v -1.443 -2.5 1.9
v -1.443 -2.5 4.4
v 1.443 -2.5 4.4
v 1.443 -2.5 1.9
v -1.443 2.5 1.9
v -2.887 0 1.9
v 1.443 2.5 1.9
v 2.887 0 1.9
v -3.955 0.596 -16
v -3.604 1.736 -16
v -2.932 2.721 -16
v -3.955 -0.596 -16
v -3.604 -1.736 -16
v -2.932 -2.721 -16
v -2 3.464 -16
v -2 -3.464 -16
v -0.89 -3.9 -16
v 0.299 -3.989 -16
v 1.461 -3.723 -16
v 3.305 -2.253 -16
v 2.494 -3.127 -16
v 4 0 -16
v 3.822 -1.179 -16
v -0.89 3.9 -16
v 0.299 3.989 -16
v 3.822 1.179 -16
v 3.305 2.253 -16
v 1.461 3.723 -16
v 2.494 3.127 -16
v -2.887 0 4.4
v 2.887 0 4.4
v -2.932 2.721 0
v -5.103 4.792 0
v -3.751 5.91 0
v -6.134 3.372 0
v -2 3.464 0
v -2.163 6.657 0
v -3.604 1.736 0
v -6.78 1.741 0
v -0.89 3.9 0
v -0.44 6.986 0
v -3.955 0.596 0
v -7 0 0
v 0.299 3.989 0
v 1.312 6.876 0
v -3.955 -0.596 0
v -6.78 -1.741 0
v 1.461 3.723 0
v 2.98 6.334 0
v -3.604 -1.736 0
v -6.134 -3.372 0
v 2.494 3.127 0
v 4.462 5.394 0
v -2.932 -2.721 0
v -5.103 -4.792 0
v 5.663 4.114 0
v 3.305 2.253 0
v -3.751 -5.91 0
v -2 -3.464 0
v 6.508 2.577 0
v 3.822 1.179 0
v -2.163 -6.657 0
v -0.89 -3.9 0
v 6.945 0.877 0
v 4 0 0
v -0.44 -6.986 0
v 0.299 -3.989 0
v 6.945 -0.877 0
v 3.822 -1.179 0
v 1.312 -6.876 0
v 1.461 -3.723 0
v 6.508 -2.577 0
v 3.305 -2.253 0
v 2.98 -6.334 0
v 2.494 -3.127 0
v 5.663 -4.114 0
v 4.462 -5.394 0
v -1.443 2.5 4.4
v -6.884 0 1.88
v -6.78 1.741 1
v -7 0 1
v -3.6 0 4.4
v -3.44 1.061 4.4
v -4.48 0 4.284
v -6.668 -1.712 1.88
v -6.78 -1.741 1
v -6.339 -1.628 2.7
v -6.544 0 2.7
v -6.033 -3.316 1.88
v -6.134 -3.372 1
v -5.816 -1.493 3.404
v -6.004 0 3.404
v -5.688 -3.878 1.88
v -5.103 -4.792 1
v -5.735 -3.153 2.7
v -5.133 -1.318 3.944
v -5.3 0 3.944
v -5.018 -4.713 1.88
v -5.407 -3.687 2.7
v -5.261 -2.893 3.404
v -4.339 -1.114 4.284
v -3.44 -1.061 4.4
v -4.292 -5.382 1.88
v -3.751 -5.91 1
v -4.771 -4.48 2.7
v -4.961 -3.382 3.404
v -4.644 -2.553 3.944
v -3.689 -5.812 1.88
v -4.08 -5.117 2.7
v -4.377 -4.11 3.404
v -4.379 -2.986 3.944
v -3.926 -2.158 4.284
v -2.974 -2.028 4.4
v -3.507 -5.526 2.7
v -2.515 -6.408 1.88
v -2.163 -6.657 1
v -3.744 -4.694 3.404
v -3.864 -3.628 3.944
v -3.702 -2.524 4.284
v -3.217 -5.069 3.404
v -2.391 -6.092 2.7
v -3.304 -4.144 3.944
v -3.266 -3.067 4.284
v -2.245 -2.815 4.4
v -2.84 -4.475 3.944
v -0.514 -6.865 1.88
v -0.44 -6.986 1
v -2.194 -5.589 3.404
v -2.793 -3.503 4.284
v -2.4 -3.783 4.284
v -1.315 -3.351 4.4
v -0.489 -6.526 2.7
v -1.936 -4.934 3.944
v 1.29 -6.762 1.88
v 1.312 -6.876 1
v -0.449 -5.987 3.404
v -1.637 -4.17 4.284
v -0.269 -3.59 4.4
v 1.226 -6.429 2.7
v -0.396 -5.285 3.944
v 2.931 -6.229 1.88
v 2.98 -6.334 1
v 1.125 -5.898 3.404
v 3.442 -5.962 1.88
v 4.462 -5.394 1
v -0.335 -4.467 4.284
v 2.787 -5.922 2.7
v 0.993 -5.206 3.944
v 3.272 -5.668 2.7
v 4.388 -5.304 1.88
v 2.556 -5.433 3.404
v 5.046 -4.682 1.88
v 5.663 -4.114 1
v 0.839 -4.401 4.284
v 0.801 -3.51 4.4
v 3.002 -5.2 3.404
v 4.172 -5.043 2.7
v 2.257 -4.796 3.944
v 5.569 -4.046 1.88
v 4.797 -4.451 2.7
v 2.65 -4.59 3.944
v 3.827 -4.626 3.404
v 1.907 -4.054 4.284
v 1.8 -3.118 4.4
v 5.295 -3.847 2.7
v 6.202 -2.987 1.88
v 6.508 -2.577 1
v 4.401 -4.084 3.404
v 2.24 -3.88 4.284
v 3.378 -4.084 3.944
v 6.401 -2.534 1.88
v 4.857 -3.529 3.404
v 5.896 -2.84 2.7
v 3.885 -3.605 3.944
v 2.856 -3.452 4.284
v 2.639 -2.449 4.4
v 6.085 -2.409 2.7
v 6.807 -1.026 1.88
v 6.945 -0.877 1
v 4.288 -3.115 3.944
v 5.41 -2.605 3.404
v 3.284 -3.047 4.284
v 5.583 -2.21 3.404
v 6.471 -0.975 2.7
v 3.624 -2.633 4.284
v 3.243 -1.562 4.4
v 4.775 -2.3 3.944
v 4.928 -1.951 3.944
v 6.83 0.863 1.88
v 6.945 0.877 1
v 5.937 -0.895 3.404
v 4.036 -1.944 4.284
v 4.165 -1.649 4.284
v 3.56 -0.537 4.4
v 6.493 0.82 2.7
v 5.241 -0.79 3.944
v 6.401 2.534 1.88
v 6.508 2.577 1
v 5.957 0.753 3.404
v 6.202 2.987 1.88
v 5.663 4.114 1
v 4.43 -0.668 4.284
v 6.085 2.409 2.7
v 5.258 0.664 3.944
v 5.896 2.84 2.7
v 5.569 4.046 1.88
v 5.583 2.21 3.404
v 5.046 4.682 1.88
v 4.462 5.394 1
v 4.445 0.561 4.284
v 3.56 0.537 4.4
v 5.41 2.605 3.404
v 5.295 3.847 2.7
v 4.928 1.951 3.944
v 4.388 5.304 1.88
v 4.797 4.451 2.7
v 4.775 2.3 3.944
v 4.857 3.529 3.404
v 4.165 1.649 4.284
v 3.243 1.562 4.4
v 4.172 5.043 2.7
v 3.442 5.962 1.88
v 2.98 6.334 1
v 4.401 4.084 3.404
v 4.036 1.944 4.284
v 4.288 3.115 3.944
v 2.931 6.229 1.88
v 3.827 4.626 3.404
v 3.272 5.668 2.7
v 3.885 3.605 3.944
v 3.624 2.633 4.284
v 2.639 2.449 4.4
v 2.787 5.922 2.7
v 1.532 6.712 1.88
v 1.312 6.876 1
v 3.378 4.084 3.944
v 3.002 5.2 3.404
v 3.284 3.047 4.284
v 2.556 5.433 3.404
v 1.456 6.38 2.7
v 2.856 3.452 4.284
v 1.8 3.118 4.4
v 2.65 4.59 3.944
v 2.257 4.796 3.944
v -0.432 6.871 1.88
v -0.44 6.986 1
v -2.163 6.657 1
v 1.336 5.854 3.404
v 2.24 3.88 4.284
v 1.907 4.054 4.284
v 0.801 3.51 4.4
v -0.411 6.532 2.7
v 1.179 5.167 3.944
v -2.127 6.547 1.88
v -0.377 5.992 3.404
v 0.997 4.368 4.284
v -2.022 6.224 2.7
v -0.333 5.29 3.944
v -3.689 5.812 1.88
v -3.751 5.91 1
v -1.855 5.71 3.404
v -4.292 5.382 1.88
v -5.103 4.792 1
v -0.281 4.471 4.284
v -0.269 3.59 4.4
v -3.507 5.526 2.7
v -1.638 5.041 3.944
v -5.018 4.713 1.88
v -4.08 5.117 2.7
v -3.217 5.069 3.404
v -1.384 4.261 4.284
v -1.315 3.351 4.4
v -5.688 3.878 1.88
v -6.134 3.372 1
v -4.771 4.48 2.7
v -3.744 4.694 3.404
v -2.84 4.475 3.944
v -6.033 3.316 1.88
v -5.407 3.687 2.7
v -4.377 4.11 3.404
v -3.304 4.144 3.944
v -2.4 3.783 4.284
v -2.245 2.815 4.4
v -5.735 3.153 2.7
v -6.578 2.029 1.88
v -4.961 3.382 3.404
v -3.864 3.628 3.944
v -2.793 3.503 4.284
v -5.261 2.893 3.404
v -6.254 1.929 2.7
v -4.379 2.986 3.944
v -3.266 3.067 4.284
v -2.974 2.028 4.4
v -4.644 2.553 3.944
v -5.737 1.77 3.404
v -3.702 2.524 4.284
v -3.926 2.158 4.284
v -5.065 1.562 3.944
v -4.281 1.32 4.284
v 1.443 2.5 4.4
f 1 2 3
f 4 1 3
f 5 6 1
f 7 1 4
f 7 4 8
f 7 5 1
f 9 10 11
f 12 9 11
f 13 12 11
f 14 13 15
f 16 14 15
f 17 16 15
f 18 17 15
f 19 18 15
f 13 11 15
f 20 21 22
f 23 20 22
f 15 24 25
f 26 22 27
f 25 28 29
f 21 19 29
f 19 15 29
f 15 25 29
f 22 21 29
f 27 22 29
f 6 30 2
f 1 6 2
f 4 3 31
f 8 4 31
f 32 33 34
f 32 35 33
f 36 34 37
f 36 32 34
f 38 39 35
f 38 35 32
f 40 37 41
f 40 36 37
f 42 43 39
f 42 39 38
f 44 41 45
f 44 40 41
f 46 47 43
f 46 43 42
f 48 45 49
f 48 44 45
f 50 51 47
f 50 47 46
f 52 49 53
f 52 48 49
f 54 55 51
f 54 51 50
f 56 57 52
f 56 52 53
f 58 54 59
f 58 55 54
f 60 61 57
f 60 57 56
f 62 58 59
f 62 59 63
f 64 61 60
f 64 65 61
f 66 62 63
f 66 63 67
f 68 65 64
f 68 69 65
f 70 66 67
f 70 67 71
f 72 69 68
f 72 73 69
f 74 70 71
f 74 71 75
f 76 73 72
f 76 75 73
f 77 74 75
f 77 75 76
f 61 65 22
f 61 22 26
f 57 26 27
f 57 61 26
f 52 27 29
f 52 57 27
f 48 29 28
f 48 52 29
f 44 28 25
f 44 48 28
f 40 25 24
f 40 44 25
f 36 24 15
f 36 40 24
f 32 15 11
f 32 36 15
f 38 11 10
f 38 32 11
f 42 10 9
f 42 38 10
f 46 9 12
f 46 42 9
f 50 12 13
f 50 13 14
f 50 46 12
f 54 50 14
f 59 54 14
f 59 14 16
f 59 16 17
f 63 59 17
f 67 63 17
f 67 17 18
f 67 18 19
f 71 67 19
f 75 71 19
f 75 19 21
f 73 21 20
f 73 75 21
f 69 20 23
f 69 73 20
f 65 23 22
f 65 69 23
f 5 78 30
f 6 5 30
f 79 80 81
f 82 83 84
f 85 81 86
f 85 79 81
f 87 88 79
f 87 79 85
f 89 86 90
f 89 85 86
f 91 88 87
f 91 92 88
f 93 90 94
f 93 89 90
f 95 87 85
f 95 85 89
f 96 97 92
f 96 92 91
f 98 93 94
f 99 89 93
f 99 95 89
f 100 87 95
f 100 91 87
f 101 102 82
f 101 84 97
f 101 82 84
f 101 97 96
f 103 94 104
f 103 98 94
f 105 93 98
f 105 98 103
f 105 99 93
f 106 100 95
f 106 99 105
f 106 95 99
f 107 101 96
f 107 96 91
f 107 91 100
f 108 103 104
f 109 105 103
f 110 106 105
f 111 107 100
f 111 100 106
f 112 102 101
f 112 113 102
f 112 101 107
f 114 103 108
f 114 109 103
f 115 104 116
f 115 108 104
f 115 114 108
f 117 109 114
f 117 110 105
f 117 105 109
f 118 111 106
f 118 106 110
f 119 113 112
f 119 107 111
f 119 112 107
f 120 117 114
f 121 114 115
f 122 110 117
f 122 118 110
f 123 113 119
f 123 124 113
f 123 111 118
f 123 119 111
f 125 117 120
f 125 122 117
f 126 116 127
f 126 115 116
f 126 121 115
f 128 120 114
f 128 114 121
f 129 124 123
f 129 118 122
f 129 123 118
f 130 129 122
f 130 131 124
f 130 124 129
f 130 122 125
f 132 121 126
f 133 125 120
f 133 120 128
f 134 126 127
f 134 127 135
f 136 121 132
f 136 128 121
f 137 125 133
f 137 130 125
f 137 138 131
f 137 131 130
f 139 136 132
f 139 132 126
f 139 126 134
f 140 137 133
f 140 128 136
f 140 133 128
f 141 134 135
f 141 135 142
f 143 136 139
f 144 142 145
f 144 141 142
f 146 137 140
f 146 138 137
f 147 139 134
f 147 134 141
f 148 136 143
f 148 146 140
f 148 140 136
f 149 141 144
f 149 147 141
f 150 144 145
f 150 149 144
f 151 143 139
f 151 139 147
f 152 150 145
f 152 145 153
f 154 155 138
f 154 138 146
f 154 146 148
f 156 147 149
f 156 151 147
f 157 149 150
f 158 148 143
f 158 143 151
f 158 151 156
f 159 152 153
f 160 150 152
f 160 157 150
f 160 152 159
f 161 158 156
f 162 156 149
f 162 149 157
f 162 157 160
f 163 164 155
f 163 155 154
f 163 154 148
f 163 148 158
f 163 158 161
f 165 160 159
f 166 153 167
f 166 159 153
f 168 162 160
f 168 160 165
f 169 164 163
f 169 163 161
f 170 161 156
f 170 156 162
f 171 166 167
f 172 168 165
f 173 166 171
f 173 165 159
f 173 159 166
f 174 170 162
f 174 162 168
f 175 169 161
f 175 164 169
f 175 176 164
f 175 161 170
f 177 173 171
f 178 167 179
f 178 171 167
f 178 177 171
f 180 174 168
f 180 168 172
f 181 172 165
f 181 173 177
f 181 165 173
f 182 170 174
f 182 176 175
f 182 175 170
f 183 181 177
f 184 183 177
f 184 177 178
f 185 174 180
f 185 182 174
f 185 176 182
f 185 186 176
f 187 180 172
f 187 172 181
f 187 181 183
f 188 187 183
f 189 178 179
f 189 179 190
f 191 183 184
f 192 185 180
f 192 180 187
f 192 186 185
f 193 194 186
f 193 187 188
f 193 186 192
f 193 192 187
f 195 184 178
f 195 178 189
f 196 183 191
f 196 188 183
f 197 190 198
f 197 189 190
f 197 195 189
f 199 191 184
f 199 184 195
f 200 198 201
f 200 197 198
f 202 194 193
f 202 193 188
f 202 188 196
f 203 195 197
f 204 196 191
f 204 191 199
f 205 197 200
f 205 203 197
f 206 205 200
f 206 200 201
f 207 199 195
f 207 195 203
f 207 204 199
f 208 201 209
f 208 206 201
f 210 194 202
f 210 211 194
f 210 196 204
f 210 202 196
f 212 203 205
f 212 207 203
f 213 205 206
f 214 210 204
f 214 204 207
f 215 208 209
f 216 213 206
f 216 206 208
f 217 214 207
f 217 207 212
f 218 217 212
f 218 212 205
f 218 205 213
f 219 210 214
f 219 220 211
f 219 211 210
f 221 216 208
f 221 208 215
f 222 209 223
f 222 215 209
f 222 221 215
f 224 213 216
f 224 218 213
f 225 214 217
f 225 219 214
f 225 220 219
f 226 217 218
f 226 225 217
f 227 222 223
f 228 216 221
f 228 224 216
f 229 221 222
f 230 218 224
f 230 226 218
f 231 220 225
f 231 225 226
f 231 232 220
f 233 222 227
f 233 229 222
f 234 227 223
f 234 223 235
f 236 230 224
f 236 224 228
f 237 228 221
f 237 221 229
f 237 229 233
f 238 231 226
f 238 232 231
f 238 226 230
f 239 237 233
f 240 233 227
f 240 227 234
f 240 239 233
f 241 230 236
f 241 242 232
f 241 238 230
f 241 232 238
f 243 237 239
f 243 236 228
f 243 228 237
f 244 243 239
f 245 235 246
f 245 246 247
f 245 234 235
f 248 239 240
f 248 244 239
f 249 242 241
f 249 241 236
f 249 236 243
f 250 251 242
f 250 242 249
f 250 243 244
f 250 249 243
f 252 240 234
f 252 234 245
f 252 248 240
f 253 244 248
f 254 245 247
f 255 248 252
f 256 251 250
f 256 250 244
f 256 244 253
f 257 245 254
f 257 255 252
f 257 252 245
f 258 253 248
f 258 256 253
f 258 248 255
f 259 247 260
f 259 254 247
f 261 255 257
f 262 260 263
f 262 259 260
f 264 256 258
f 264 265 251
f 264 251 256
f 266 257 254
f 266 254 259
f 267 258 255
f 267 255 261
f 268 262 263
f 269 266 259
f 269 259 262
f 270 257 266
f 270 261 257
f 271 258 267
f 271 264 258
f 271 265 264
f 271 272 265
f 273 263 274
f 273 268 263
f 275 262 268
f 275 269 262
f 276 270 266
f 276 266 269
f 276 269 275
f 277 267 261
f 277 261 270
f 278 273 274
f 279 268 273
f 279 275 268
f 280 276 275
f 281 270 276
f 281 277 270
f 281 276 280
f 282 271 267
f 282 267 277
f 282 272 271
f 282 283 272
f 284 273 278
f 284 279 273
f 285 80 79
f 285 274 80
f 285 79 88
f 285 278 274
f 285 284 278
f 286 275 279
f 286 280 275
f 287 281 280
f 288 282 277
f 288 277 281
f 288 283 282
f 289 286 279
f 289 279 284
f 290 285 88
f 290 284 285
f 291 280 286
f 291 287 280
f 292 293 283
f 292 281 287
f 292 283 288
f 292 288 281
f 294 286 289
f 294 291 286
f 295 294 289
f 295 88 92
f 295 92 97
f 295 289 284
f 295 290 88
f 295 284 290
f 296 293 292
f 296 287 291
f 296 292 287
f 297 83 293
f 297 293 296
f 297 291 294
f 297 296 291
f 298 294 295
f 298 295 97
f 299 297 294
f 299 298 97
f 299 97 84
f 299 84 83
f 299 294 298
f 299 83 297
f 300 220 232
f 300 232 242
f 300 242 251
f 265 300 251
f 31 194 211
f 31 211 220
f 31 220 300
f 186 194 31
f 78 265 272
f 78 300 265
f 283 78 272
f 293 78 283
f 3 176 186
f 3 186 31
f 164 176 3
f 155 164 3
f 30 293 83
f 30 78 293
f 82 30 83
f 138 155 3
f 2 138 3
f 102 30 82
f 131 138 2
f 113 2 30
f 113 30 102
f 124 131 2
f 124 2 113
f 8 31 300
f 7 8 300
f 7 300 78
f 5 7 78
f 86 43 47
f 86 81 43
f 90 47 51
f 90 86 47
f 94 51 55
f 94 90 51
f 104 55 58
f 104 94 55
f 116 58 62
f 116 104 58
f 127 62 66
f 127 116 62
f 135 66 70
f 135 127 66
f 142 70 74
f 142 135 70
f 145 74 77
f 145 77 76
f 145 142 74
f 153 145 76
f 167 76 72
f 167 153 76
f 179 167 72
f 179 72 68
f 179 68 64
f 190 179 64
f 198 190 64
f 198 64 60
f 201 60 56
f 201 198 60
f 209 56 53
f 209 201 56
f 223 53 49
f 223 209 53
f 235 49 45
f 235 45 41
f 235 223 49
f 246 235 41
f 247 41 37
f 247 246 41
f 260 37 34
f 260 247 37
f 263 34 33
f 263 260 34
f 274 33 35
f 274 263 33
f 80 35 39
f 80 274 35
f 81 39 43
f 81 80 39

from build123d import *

# Parameters (mm, degrees)
SKETCH1_R          = 4
EXTRUDE1_DEPTH     = 16
CUT_EXTRUDE1_DEPTH = 2.5


with BuildPart() as part:
    # Sketch1 → Extrude1 (new body)
    with BuildSketch(Plane.XY):
        Circle(SKETCH1_R)
    extrude(amount=-EXTRUDE1_DEPTH)

    # Sketch2 → Revolve1 (revolve)
    with BuildSketch(Plane(origin=(0, 0, 0), x_dir=(0, 0, -1), z_dir=(1, 0, 0)), mode=Mode.PRIVATE) as revolve1_sk:
        with BuildLine():
            Line((0, 0), (0, 7))
            Line((0, 7), (-1, 7))
            ThreePointArc((-1, 7), (-3.404163056, 6.004163056), (-4.4, 3.6))
            Line((-4.4, 3.6), (-4.4, 0))
            Line((-4.4, 0), (0, 0))
        make_face()
    revolve(revolve1_sk.sketch.rotate(Axis((0, 0, 0), (0, 0, 1)), 90), axis=Axis((0, 0, 0), (0, 0, 1)))

    # Sketch3 → Cut-Extrude1 (cut)
    with BuildSketch(Plane.XY.offset(4.4)):
        Polygon((-1.443375673, 2.5), (-2.886751346, 0), (-1.443375673, -2.5), (1.443375673, -2.5), (2.886751346, 0), (1.443375673, 2.5), align=None)
    extrude(amount=-CUT_EXTRUDE1_DEPTH, mode=Mode.SUBTRACT)


solid = part.part
